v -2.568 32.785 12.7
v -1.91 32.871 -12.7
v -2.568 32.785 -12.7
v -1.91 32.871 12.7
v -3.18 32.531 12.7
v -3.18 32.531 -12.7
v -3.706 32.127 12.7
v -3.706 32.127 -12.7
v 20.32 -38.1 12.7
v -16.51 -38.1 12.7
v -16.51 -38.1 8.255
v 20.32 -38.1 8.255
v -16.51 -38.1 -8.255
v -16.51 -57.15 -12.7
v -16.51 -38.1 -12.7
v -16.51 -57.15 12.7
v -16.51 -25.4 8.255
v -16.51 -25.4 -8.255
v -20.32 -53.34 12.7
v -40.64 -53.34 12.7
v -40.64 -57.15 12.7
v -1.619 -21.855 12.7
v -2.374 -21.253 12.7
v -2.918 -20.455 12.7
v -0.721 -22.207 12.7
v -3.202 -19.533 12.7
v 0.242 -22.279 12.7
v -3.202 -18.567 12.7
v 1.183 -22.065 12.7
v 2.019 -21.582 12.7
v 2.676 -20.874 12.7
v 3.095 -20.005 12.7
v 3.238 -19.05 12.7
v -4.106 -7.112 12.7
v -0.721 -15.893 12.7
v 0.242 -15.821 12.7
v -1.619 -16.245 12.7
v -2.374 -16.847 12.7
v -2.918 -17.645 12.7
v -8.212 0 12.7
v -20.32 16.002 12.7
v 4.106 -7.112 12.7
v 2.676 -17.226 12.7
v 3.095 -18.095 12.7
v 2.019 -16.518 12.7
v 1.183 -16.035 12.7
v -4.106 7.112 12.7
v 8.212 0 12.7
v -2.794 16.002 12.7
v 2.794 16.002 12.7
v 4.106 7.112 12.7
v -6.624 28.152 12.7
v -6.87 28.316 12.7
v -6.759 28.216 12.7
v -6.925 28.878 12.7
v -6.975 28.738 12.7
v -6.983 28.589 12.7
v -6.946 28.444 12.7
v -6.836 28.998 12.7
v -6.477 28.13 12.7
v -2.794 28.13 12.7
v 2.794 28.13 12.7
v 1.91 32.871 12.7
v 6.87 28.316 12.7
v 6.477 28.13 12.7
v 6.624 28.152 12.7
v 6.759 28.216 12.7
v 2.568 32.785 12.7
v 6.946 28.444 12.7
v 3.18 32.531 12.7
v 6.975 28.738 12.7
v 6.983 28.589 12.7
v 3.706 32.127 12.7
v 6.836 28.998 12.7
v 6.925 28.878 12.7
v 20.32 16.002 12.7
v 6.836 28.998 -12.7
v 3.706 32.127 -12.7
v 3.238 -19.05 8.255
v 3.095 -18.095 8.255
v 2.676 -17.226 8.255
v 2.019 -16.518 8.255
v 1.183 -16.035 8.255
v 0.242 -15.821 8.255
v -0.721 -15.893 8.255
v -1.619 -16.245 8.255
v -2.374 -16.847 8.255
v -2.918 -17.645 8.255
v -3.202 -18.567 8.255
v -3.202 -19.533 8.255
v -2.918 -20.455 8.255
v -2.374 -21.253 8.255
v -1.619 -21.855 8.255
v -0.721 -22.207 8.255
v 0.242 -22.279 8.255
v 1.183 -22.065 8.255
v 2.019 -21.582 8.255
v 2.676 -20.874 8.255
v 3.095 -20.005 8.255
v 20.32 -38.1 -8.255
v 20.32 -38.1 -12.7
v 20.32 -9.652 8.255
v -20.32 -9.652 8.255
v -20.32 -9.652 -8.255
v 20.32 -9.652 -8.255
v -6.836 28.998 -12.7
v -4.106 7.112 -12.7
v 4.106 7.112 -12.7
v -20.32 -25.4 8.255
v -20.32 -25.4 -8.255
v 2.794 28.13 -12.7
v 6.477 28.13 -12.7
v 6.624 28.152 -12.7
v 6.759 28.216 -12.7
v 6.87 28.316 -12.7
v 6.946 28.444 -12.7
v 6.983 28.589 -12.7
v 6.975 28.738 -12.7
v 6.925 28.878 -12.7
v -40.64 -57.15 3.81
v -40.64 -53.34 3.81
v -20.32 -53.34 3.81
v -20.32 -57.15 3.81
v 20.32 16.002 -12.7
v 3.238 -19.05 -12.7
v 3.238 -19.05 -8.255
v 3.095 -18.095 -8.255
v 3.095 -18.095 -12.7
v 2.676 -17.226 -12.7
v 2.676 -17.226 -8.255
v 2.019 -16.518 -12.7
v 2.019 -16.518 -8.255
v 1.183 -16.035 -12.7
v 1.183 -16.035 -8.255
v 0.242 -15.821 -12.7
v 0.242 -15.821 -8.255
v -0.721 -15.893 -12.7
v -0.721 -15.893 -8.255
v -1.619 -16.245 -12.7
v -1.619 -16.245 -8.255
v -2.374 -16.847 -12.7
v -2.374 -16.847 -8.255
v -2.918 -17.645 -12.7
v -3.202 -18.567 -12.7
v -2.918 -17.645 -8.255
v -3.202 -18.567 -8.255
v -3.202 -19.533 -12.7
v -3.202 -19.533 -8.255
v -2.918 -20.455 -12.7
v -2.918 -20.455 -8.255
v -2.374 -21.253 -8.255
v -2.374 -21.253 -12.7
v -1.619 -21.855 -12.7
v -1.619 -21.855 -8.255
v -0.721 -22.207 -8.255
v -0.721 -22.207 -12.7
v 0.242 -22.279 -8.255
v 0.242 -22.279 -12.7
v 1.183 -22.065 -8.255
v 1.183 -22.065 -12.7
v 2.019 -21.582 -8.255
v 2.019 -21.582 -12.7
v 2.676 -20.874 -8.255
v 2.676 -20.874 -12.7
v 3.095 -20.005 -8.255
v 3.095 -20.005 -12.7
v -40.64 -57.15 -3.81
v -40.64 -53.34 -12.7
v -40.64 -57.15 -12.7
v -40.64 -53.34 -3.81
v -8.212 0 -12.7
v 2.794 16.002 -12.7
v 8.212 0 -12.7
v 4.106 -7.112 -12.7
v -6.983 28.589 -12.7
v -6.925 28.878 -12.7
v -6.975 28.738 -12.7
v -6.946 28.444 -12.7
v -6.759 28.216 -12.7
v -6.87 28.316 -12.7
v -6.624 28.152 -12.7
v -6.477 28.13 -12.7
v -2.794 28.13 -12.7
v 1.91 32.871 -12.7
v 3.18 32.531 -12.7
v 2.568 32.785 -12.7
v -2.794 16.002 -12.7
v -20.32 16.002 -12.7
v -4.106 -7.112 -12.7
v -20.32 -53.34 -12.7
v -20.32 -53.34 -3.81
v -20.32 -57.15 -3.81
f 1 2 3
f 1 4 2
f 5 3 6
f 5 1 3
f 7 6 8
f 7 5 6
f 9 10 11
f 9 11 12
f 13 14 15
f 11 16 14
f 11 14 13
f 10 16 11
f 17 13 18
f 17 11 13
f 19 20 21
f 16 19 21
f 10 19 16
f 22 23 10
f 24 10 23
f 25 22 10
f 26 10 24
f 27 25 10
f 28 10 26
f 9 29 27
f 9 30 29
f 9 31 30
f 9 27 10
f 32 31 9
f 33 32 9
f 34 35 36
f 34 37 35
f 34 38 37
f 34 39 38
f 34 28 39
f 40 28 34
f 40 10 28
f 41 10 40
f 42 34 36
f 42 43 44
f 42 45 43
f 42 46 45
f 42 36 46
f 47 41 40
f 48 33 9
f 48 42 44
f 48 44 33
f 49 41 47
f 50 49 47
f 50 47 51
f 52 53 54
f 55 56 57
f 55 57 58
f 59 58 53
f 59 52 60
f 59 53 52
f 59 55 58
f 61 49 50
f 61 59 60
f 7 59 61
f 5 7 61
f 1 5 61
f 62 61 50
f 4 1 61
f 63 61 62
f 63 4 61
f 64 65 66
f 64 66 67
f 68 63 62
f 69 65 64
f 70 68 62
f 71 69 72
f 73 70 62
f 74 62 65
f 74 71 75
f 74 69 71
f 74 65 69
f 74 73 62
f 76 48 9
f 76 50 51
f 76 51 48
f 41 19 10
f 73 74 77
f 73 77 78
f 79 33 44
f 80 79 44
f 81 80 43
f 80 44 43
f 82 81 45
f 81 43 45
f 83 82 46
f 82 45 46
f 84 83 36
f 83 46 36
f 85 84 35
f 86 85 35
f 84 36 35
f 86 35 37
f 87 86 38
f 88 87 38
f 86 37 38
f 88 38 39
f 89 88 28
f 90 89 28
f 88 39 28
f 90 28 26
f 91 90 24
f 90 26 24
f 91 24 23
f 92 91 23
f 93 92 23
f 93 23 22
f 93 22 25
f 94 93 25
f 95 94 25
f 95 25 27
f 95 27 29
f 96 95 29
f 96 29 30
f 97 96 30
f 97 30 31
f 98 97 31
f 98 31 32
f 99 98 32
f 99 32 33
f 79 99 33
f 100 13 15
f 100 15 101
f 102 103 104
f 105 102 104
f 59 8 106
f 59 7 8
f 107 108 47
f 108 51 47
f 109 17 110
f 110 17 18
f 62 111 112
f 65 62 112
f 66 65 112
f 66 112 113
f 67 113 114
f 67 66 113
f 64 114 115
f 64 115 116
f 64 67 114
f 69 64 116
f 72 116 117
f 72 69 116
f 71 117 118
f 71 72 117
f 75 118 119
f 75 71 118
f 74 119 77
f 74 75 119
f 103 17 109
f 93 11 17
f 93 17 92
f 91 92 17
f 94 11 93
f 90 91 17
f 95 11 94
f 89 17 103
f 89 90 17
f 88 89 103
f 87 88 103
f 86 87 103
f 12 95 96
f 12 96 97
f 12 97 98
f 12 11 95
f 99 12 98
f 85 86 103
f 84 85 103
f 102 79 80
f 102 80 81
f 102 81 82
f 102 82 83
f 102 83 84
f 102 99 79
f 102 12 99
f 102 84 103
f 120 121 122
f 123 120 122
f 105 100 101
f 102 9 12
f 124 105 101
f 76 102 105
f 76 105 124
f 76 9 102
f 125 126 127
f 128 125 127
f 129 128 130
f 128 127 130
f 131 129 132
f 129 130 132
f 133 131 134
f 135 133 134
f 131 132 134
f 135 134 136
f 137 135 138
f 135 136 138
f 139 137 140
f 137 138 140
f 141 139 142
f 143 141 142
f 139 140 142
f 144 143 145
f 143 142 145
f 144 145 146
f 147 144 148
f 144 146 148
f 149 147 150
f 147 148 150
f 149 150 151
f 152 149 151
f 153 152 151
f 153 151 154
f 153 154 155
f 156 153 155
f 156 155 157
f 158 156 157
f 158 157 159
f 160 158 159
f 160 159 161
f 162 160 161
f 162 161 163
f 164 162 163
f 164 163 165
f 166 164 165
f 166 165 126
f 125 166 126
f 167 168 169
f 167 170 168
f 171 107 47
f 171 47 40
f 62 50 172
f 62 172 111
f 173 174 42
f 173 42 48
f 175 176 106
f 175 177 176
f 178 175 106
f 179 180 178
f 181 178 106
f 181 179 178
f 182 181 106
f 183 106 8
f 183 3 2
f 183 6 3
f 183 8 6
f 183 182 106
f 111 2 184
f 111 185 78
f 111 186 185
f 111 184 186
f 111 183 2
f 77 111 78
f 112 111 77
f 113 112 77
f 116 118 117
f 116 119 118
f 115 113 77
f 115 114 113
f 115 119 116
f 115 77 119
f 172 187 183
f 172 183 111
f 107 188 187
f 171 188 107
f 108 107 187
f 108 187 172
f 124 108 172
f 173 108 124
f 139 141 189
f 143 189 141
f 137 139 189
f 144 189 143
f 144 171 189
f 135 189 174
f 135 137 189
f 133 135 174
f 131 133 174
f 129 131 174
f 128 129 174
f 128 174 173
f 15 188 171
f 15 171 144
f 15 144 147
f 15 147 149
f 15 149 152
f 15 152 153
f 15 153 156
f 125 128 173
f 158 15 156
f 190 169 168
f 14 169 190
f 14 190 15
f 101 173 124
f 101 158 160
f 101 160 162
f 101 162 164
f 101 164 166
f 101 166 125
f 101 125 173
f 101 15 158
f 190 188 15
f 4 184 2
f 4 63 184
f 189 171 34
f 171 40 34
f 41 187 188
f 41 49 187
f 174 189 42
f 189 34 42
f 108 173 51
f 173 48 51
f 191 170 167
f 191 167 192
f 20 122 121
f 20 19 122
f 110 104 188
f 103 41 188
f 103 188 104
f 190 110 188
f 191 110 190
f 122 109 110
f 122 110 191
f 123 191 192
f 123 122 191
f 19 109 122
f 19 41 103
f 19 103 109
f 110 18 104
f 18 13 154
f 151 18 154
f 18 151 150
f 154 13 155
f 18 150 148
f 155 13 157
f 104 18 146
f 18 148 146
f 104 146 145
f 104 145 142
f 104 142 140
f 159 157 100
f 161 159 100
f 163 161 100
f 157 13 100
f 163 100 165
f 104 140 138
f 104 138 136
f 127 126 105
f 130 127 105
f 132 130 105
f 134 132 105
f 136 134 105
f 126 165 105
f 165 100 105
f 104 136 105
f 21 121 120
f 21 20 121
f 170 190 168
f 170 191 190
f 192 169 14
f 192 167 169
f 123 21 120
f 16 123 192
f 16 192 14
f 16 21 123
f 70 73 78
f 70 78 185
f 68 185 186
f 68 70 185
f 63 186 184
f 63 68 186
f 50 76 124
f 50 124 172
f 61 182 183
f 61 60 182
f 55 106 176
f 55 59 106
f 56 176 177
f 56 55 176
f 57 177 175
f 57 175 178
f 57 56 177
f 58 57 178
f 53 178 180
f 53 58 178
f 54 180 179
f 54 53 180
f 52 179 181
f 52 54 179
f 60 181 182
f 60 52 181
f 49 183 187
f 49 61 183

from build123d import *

# Parameters (mm, degrees)
BOSS_EXTRUDE1_DEPTH             = 12.7
BOSS_EXTRUDE4_REACH             = 14.7
BOSS_EXTRUDE4_DIRECTION_2_REACH = 14.7
SKETCH6_W                       = 16.51
SKETCH6_H                       = 15.748
CUT_EXTRUDE2_DEPTH              = 61.96
SKETCH11_W                      = 20.32
SKETCH11_H                      = 7.62
CUT_EXTRUDE3_DEPTH              = 3.81
SKETCH15_R                      = 3.2385
CUT_EXTRUDE4_DEPTH              = 25.4
SKETCH16_W                      = 16.51
SKETCH16_H                      = 12.7
CUT_EXTRUDE5_DEPTH              = 36.83


with BuildPart() as part:
    # Sketch1 → Boss-Extrude1 (new body, symmetric)
    with BuildSketch(Plane.XY):
        with BuildLine():
            Line((-20.32, 16.002), (-20.32, -38.1))
            Line((-20.32, -38.1), (20.32, -38.1))
            Line((20.32, -38.1), (20.32, 16.002))
            Line((20.32, 16.002), (2.794, 16.002))
            Line((2.794, 16.002), (2.794, 28.1305))
            Line((2.794, 28.1305), (6.477, 28.1305))
            ThreePointArc((6.477, 28.1305), (6.946330803, 28.444096816), (6.836210245, 28.997710245))
            Line((6.836210245, 28.997710245), (3.706459265, 32.127461224))
            ThreePointArc((3.706459265, 32.127461224), (2.882423959, 32.678064013), (1.910408041, 32.87141))
            Line((1.910408041, 32.87141), (-1.910408041, 32.87141))
            ThreePointArc((-1.910408041, 32.87141), (-2.882423959, 32.678064013), (-3.706459265, 32.127461224))
            Line((-3.706459265, 32.127461224), (-6.836210245, 28.997710245))
            ThreePointArc((-6.836210245, 28.997710245), (-6.946330803, 28.444096816), (-6.477, 28.1305))
            Line((-6.477, 28.1305), (-2.794, 28.1305))
            Line((-2.794, 28.1305), (-2.794, 16.002))
            Line((-2.794, 16.002), (-20.32, 16.002))
        make_face()
        Polygon((-4.106115114, 7.112), (-8.212230229, 0), (-4.106115114, -7.112), (4.106115114, -7.112), (8.212230229, 0), (4.106115114, 7.112), align=None, mode=Mode.SUBTRACT)
    extrude(amount=BOSS_EXTRUDE1_DEPTH, both=True)

    # Boss-Extrude4: up to this face of the body (flat: up to its plane)
    boss_extrude4_end = Plane(part.part.faces().sort_by_distance((0, -9.949298675, 12.7))[0])
    # Sketch10 → Boss-Extrude4 (add, up to the picked face)
    with BuildSketch(Plane.XY, mode=Mode.PRIVATE) as boss_extrude4_sk1:
        Polygon((-20.32, -38.1), (-20.32, -53.34), (-40.64, -53.34), (-40.64, -57.15), (-16.51, -57.15), (-16.51, -38.1), align=None)
    boss_extrude4_tool1 = split(extrude(boss_extrude4_sk1.sketch, amount=BOSS_EXTRUDE4_REACH, mode=Mode.PRIVATE), bisect_by=boss_extrude4_end, keep=Keep.BOTH, mode=Mode.PRIVATE)
    add(boss_extrude4_tool1.solids().sort_by_distance((-20.012566, -45.72, 0))[0])

    # Boss-Extrude4 direction 2: up to this face of the body (flat: up to its plane)
    boss_extrude4_direction_2_end = Plane(part.part.faces().sort_by_distance((0, -9.949298675, -12.7))[0])
    # Sketch10 → Boss-Extrude4 direction 2 (add, up to the picked face)
    with BuildSketch(Plane.XY, mode=Mode.PRIVATE) as boss_extrude4_direction_2_sk1:
        Polygon((-20.32, -38.1), (-20.32, -53.34), (-40.64, -53.34), (-40.64, -57.15), (-16.51, -57.15), (-16.51, -38.1), align=None)
    boss_extrude4_direction_2_tool1 = split(extrude(boss_extrude4_direction_2_sk1.sketch, amount=-BOSS_EXTRUDE4_DIRECTION_2_REACH, mode=Mode.PRIVATE), bisect_by=boss_extrude4_direction_2_end, keep=Keep.BOTH, mode=Mode.PRIVATE)
    add(boss_extrude4_direction_2_tool1.solids().sort_by_distance((-20.012566, -45.72, 0))[0])

    # Sketch6 → Cut-Extrude2 (cut, through all)
    with BuildSketch(Plane(origin=(20.32, 0, 0), x_dir=(0, 0, -1), z_dir=(1, 0, 0))):
        with Locations((0, -17.526)):
            Rectangle(SKETCH6_W, SKETCH6_H)
    extrude(amount=-CUT_EXTRUDE2_DEPTH, mode=Mode.SUBTRACT)

    # Sketch11 → Cut-Extrude3 (cut)
    with BuildSketch(Plane(origin=(0, -53.34, 0), x_dir=(1, 0, 0), z_dir=(0, 1, 0))):
        with Locations((-30.48, 0)):
            Rectangle(SKETCH11_W, SKETCH11_H)
    extrude(amount=-CUT_EXTRUDE3_DEPTH, mode=Mode.SUBTRACT)

    # Sketch15 → Cut-Extrude4 (cut)
    with BuildSketch(Plane.XY.offset(12.7)):
        with Locations((0, -19.05)):
            Circle(SKETCH15_R)
    extrude(amount=-CUT_EXTRUDE4_DEPTH, mode=Mode.SUBTRACT)

    # Sketch16 → Cut-Extrude5 (cut)
    with BuildSketch(Plane(origin=(20.32, 0, 0), x_dir=(0, 0, -1), z_dir=(1, 0, 0))):
        with Locations((0, -31.75)):
            Rectangle(SKETCH16_W, SKETCH16_H)
    extrude(amount=-CUT_EXTRUDE5_DEPTH, mode=Mode.SUBTRACT)


solid = part.part
